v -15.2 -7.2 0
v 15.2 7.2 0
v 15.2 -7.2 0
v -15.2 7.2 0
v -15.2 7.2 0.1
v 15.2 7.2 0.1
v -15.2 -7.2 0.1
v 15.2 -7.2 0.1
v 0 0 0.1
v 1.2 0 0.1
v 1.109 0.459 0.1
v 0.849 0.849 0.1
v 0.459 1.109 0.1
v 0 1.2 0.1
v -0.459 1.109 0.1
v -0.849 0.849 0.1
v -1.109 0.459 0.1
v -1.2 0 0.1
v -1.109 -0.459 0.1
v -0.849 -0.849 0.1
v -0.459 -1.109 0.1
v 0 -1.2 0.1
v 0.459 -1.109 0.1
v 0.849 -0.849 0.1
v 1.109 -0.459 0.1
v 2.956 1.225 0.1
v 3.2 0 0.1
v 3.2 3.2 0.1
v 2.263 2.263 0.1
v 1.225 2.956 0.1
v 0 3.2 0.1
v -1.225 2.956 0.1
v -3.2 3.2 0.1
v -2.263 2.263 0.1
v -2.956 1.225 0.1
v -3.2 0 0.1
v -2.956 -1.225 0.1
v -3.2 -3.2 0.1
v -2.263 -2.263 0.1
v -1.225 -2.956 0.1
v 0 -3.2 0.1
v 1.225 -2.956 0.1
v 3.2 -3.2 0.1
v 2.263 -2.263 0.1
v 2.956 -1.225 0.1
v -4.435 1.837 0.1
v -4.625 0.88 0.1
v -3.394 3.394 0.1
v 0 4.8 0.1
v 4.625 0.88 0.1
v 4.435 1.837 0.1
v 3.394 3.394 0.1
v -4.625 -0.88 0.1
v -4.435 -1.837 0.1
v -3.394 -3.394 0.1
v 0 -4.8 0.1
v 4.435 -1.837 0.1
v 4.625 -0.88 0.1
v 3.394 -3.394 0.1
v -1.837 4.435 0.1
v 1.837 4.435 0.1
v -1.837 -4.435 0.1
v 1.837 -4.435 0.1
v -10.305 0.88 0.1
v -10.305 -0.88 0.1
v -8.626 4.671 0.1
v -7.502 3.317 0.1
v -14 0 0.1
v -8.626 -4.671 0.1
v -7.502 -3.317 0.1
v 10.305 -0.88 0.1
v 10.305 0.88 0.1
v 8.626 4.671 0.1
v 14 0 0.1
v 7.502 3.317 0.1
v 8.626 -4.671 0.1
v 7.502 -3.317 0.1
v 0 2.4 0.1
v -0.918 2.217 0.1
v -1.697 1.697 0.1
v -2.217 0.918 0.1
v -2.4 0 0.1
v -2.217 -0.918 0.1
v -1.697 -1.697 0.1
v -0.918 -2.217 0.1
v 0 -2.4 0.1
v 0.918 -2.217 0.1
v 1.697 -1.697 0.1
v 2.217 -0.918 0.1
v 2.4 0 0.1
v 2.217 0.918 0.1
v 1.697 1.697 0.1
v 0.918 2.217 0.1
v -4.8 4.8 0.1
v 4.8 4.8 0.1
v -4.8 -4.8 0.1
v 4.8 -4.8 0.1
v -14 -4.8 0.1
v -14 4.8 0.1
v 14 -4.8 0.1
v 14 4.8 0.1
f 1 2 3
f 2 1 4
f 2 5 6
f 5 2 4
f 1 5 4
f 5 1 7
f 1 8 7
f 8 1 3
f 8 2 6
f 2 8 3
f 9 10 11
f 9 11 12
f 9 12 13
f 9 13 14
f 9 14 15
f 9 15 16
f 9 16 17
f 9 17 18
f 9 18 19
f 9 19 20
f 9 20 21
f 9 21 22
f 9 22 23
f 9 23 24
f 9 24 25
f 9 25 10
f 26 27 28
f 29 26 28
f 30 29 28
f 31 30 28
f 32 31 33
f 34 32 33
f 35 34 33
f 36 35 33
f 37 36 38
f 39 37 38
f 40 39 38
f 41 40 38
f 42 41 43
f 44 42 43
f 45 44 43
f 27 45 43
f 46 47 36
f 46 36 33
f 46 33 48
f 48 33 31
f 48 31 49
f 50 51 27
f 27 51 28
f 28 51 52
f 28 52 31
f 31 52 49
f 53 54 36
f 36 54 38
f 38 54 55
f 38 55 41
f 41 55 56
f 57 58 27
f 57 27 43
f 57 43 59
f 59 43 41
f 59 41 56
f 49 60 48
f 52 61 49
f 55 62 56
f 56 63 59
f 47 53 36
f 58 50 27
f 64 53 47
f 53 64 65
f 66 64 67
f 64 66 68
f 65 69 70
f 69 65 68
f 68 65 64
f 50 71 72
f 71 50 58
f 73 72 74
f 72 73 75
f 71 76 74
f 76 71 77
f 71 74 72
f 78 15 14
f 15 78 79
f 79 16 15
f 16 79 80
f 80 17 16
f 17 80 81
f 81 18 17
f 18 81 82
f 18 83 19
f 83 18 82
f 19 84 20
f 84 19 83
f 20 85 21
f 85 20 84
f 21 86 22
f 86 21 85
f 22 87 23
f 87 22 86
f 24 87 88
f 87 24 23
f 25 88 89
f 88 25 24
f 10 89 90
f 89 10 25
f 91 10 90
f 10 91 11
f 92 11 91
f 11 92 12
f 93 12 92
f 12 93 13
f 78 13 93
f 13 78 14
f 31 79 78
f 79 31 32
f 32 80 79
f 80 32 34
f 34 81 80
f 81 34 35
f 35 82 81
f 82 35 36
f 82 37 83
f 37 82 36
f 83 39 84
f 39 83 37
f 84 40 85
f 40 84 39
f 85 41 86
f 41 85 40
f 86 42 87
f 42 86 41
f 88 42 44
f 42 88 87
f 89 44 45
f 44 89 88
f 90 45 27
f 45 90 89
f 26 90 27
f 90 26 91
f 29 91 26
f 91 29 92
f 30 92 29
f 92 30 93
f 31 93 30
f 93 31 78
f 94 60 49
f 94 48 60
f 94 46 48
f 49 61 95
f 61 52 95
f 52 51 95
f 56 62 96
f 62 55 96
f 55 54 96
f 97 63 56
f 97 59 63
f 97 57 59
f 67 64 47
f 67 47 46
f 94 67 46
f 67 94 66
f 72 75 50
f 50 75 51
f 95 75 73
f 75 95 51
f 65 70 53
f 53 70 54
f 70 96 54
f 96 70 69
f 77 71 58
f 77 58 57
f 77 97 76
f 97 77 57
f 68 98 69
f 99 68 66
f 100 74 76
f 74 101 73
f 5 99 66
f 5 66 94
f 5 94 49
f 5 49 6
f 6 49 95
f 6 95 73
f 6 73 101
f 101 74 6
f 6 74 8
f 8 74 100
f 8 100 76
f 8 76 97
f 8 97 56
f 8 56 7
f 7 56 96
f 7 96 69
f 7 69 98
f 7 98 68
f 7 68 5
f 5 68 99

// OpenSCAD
// file: ../p/empty.scad
use <../lib.scad>
function ldraw_lib__empty() = [
// 0 Empty
// 0 Name: empty.dat
// 0 Author: Steffen [Steffen]
// 0 !LDRAW_ORG Primitive UPDATE 2015-01
// 0 !LICENSE Licensed under CC BY 4.0 : see CAreadme.txt
// 
// 0 BFC CERTIFY CCW
  [0,"BFC","CERTIFY"],
  [0,"BFC","CCW"],
// 
// 0 !HISTORY 2015-10-11 [PTadmin] Official Update 2015-01
// 
// 
// 0 // Tool MLCad cannot handle really empty files. This file is used as a workaround.
// 0 // It exceptionally contains forbidden non-LDRAW standard syntax to satisfy MLCad until it is fixed OR a different editor has become the de-facto LDRAW standard.
// 0 // The line being used here is an "impossible" conditional line which never should be visible,
// 0 // additionally hidden by a syntax explicitly hiding it from displaying.
// 
// 0 MLCAD HIDE 5 24 0 0 0 0.0001 0 0 0.0001 -0.0001 0 0 0 0
];
module ldraw_lib__empty(step=0, col=false, unit=2/5, alt=false, line=0.2, solid=!$preview)
    makepoly(ldraw_lib__empty(), step=step, col=col, unit=unit, alt=alt, line=line, solid=solid);
ldraw_lib__empty(line=0.2);
// file: ../p/4-4ndis.scad
use <../lib.scad>
function ldraw_lib__4_4ndis() = [
// 0 Disc Negative 1.0
// 0 Name: 4-4ndis.dat
// 0 Author: James Jessiman
// 0 !LDRAW_ORG Primitive UPDATE 2012-01
// 0 !LICENSE Licensed under CC BY 4.0 : see CAreadme.txt
// 
// 0 BFC CERTIFY CCW
  [0,"BFC","CERTIFY"],
  [0,"BFC","CCW"],
// 
// 0 !HISTORY 2002-03-23 [sbliss] Added BFC statement; compacted code
// 0 !HISTORY 2002-04-25 [PTadmin] Official Update 2002-02
// 0 !HISTORY 2007-06-24 [PTadmin] Header formatted for Contributor Agreement
// 0 !HISTORY 2008-07-01 [PTadmin] Official Update 2008-01
// 0 !HISTORY 2012-02-16 [Philo] Changed to CCW
// 0 !HISTORY 2012-03-30 [PTadmin] Official Update 2012-01
// 
// 
// 3 16 0.9239 0 0.3827 1 0 0 1 0 1
  [3,16,0.9239,0,0.3827,1,0,0,1,0,1],
// 3 16 0.7071 0 0.7071 0.9239 0 0.3827 1 0 1
  [3,16,0.7071,0,0.7071,0.9239,0,0.3827,1,0,1],
// 3 16 0.3827 0 0.9239 0.7071 0 0.7071 1 0 1
  [3,16,0.3827,0,0.9239,0.7071,0,0.7071,1,0,1],
// 3 16 0 0 1 0.3827 0 0.9239 1 0 1
  [3,16,0,0,1,0.3827,0,0.9239,1,0,1],
// 3 16 -0.3827 0 0.9239 0 0 1 -1 0 1
  [3,16,-0.3827,0,0.9239,0,0,1,-1,0,1],
// 3 16 -0.7071 0 0.7071 -0.3827 0 0.9239 -1 0 1
  [3,16,-0.7071,0,0.7071,-0.3827,0,0.9239,-1,0,1],
// 3 16 -0.9239 0 0.3827 -0.7071 0 0.7071 -1 0 1
  [3,16,-0.9239,0,0.3827,-0.7071,0,0.7071,-1,0,1],
// 3 16 -1 0 0 -0.9239 0 0.3827 -1 0 1
  [3,16,-1,0,0,-0.9239,0,0.3827,-1,0,1],
// 3 16 -0.9239 0 -0.3827 -1 0 0 -1 0 -1
  [3,16,-0.9239,0,-0.3827,-1,0,0,-1,0,-1],
// 3 16 -0.7071 0 -0.7071 -0.9239 0 -0.3827 -1 0 -1
  [3,16,-0.7071,0,-0.7071,-0.9239,0,-0.3827,-1,0,-1],
// 3 16 -0.3827 0 -0.9239 -0.7071 0 -0.7071 -1 0 -1
  [3,16,-0.3827,0,-0.9239,-0.7071,0,-0.7071,-1,0,-1],
// 3 16 0 0 -1 -0.3827 0 -0.9239 -1 0 -1
  [3,16,0,0,-1,-0.3827,0,-0.9239,-1,0,-1],
// 3 16 0.3827 0 -0.9239 0 0 -1 1 0 -1
  [3,16,0.3827,0,-0.9239,0,0,-1,1,0,-1],
// 3 16 0.7071 0 -0.7071 0.3827 0 -0.9239 1 0 -1
  [3,16,0.7071,0,-0.7071,0.3827,0,-0.9239,1,0,-1],
// 3 16 0.9239 0 -0.3827 0.7071 0 -0.7071 1 0 -1
  [3,16,0.9239,0,-0.3827,0.7071,0,-0.7071,1,0,-1],
// 3 16 1 0 0 0.9239 0 -0.3827 1 0 -1
  [3,16,1,0,0,0.9239,0,-0.3827,1,0,-1],
];
module ldraw_lib__4_4ndis(step=0, col=false, unit=2/5, alt=false, line=0.2, solid=!$preview)
    makepoly(ldraw_lib__4_4ndis(), step=step, col=col, unit=unit, alt=alt, line=line, solid=solid);
ldraw_lib__4_4ndis(line=0.2);
// file: ../p/4-4disc.scad
use <../lib.scad>
function ldraw_lib__4_4disc() = [
// 0 Disc 1.0
// 0 Name: 4-4disc.dat
// 0 Author: James Jessiman
// 0 !LDRAW_ORG Primitive UPDATE 2002-02
// 0 !LICENSE Licensed under CC BY 4.0 : see CAreadme.txt
// 
// 0 BFC CERTIFY CCW
  [0,"BFC","CERTIFY"],
  [0,"BFC","CCW"],
// 
// 0 !HISTORY 1998-12-15 [PTadmin] Official Update 1998-10
// 0 !HISTORY 2002-03-23 [sbliss] Added BFC statement
// 0 !HISTORY 2002-04-25 [PTadmin] Official Update 2002-02
// 0 !HISTORY 2007-06-24 [PTadmin] Header formatted for Contributor Agreement
// 0 !HISTORY 2008-07-01 [PTadmin] Official Update 2008-01
// 
// 
// 3 16 0 0 0 1 0 0 0.9239 0 0.3827
  [3,16,0,0,0,1,0,0,0.9239,0,0.3827],
// 3 16 0 0 0 0.9239 0 0.3827 0.7071 0 0.7071
  [3,16,0,0,0,0.9239,0,0.3827,0.7071,0,0.7071],
// 3 16 0 0 0 0.7071 0 0.7071 0.3827 0 0.9239
  [3,16,0,0,0,0.7071,0,0.7071,0.3827,0,0.9239],
// 3 16 0 0 0 0.3827 0 0.9239 0 0 1
  [3,16,0,0,0,0.3827,0,0.9239,0,0,1],
// 3 16 0 0 0 0 0 1 -0.3827 0 0.9239
  [3,16,0,0,0,0,0,1,-0.3827,0,0.9239],
// 3 16 0 0 0 -0.3827 0 0.9239 -0.7071 0 0.7071
  [3,16,0,0,0,-0.3827,0,0.9239,-0.7071,0,0.7071],
// 3 16 0 0 0 -0.7071 0 0.7071 -0.9239 0 0.3827
  [3,16,0,0,0,-0.7071,0,0.7071,-0.9239,0,0.3827],
// 3 16 0 0 0 -0.9239 0 0.3827 -1 0 -0
  [3,16,0,0,0,-0.9239,0,0.3827,-1,0,-0],
// 3 16 0 0 0 -1 0 -0 -0.9239 0 -0.3827
  [3,16,0,0,0,-1,0,-0,-0.9239,0,-0.3827],
// 3 16 0 0 0 -0.9239 0 -0.3827 -0.7071 0 -0.7071
  [3,16,0,0,0,-0.9239,0,-0.3827,-0.7071,0,-0.7071],
// 3 16 0 0 0 -0.7071 0 -0.7071 -0.3827 0 -0.9239
  [3,16,0,0,0,-0.7071,0,-0.7071,-0.3827,0,-0.9239],
// 3 16 0 0 0 -0.3827 0 -0.9239 0 0 -1
  [3,16,0,0,0,-0.3827,0,-0.9239,0,0,-1],
// 3 16 0 0 0 0 0 -1 0.3827 0 -0.9239
  [3,16,0,0,0,0,0,-1,0.3827,0,-0.9239],
// 3 16 0 0 0 0.3827 0 -0.9239 0.7071 0 -0.7071
  [3,16,0,0,0,0.3827,0,-0.9239,0.7071,0,-0.7071],
// 3 16 0 0 0 0.7071 0 -0.7071 0.9239 0 -0.3827
  [3,16,0,0,0,0.7071,0,-0.7071,0.9239,0,-0.3827],
// 3 16 0 0 0 0.9239 0 -0.3827 1 0 0
  [3,16,0,0,0,0.9239,0,-0.3827,1,0,0],
// 0
];
module ldraw_lib__4_4disc(step=0, col=false, unit=2/5, alt=false, line=0.2, solid=!$preview)
    makepoly(ldraw_lib__4_4disc(), step=step, col=col, unit=unit, alt=alt, line=line, solid=solid);
ldraw_lib__4_4disc(line=0.2);
// file: ../p/1-8chrd.scad
use <../lib.scad>
function ldraw_lib__1_8chrd() = [
// 0 Chord 0.125
// 0 Name: 1-8chrd.dat
// 0 Author: Orion Pobursky [OrionP]
// 0 !LDRAW_ORG Primitive UPDATE 2023-05
// 0 !LICENSE Licensed under CC BY 4.0 : see CAreadme.txt
// 
// 0 BFC CERTIFY CCW
  [0,"BFC","CERTIFY"],
  [0,"BFC","CCW"],
// 
// 0 !HISTORY 2004-04-22 [PTadmin] Official Update 2004-02
// 0 !HISTORY 2007-06-22 [PTadmin] Header formatted for Contributor Agreement
// 0 !HISTORY 2008-07-01 [PTadmin] Official Update 2008-01
// 0 !HISTORY 2023-10-27 [OrionP] Rebuilt with PrimGen2, original author westrate
// 0 !HISTORY 2023-10-31 [OrionP] Official Update 2023-05
// 
// 3 16 1 0 0 0.9239 0 0.3827 0.7071 0 0.7071
  [3,16,1,0,0,0.9239,0,0.3827,0.7071,0,0.7071],
];
module ldraw_lib__1_8chrd(step=0, col=false, unit=2/5, alt=false, line=0.2, solid=!$preview)
    makepoly(ldraw_lib__1_8chrd(), step=step, col=col, unit=unit, alt=alt, line=line, solid=solid);
ldraw_lib__1_8chrd(line=0.2);
// file: ../p/1-16chrd.scad
use <../lib.scad>
use <empty.scad>
function ldraw_lib__1_16chrd() = [
// 0 Chord 0.0625
// 0 Name: 1-16chrd.dat
// 0 Author: Philippe Hurbain [Philo]
// 0 !LDRAW_ORG Primitive UPDATE 2015-01
// 0 !LICENSE Licensed under CC BY 4.0 : see CAreadme.txt
// 
// 0 BFC CERTIFY CCW
  [0,"BFC","CERTIFY"],
  [0,"BFC","CCW"],
// 
// 0 !HISTORY 2015-10-11 [PTadmin] Official Update 2015-01
// 
// 
// 0 // This file is intentionally empty because at the current \P resolution,
// 0 // an 1-16chrd is actually empty. However, this file still is present
// 0 // to allow tools to do primitives substition and fill in a real chrd here,
// 0 // or, if desired, to substitute this with the hi-res 48\1-16chrd.
// 
// 0 // This file is based on an idea by Darats at http://forums.ldraw.org/read.php?19,14500,14500#msg-14500
// 
// 1 16 0 0 0 1 0 0 0 1 0 0 0 1 empty.dat
  [1,16,0,0,0,1,0,0,0,1,0,0,0,1, ldraw_lib__empty()],
];
module ldraw_lib__1_16chrd(step=0, col=false, unit=2/5, alt=false, line=0.2, solid=!$preview)
    makepoly(ldraw_lib__1_16chrd(), step=step, col=col, unit=unit, alt=alt, line=line, solid=solid);
ldraw_lib__1_16chrd(line=0.2);
// file: ../p/4-4ring3.scad
use <../lib.scad>
function ldraw_lib__4_4ring3() = [
// 0 Ring  3 x 1.0
// 0 Name: 4-4ring3.dat
// 0 Author: James Jessiman
// 0 !LDRAW_ORG Primitive UPDATE 2009-01
// 0 !LICENSE Licensed under CC BY 4.0 : see CAreadme.txt
// 
// 0 BFC CERTIFY CCW
  [0,"BFC","CERTIFY"],
  [0,"BFC","CCW"],
// 
// 0 !HISTORY 1998-12-15 [PTadmin] Official Update 1998-10
// 0 !HISTORY 2002-04-05 [hafhead] Added BFC statement
// 0 !HISTORY 2002-04-25 [PTadmin] Official Update 2002-02
// 0 !HISTORY 2007-06-24 [PTadmin] Header formatted for Contributor Agreement
// 0 !HISTORY 2008-07-01 [PTadmin] Official Update 2008-01
// 0 !HISTORY 2008-08-26 [cwdee] Switch polygon winding and rename
// 0 !HISTORY 2009-05-02 [PTadmin] Official Update 2009-01
// 
// 
// 4 16 -1.5308 0 3.6956 -1.1481 0 2.7717 0 0 3 0 0 4
  [4,16,-1.5308,0,3.6956,-1.1481,0,2.7717,0,0,3,0,0,4],
// 4 16 -2.8284 0 2.8284 -2.1213 0 2.1213 -1.1481 0 2.7717 -1.5308 0 3.6956
  [4,16,-2.8284,0,2.8284,-2.1213,0,2.1213,-1.1481,0,2.7717,-1.5308,0,3.6956],
// 4 16 -3.6956 0 1.5308 -2.7717 0 1.1481 -2.1213 0 2.1213 -2.8284 0 2.8284
  [4,16,-3.6956,0,1.5308,-2.7717,0,1.1481,-2.1213,0,2.1213,-2.8284,0,2.8284],
// 4 16 -4 0 0 -3 0 0 -2.7717 0 1.1481 -3.6956 0 1.5308
  [4,16,-4,0,0,-3,0,0,-2.7717,0,1.1481,-3.6956,0,1.5308],
// 4 16 -3.6956 0 -1.5308 -2.7717 0 -1.1481 -3 0 0 -4 0 0
  [4,16,-3.6956,0,-1.5308,-2.7717,0,-1.1481,-3,0,0,-4,0,0],
// 4 16 -2.8284 0 -2.8284 -2.1213 0 -2.1213 -2.7717 0 -1.1481 -3.6956 0 -1.5308
  [4,16,-2.8284,0,-2.8284,-2.1213,0,-2.1213,-2.7717,0,-1.1481,-3.6956,0,-1.5308],
// 4 16 -1.5308 0 -3.6956 -1.1481 0 -2.7717 -2.1213 0 -2.1213 -2.8284 0 -2.8284
  [4,16,-1.5308,0,-3.6956,-1.1481,0,-2.7717,-2.1213,0,-2.1213,-2.8284,0,-2.8284],
// 4 16 0 0 -4 0 0 -3 -1.1481 0 -2.7717 -1.5308 0 -3.6956
  [4,16,0,0,-4,0,0,-3,-1.1481,0,-2.7717,-1.5308,0,-3.6956],
// 4 16 1.5308 0 -3.6956 1.1481 0 -2.7717 0 0 -3 0 0 -4
  [4,16,1.5308,0,-3.6956,1.1481,0,-2.7717,0,0,-3,0,0,-4],
// 4 16 2.8284 0 -2.8284 2.1213 0 -2.1213 1.1481 0 -2.7717 1.5308 0 -3.6956
  [4,16,2.8284,0,-2.8284,2.1213,0,-2.1213,1.1481,0,-2.7717,1.5308,0,-3.6956],
// 4 16 3.6956 0 -1.5308 2.7717 0 -1.1481 2.1213 0 -2.1213 2.8284 0 -2.8284
  [4,16,3.6956,0,-1.5308,2.7717,0,-1.1481,2.1213,0,-2.1213,2.8284,0,-2.8284],
// 4 16 4 0 0 3 0 0 2.7717 0 -1.1481 3.6956 0 -1.5308
  [4,16,4,0,0,3,0,0,2.7717,0,-1.1481,3.6956,0,-1.5308],
// 4 16 3.6956 0 1.5308 2.7717 0 1.1481 3 0 0 4 0 0
  [4,16,3.6956,0,1.5308,2.7717,0,1.1481,3,0,0,4,0,0],
// 4 16 2.8284 0 2.8284 2.1213 0 2.1213 2.7717 0 1.1481 3.6956 0 1.5308
  [4,16,2.8284,0,2.8284,2.1213,0,2.1213,2.7717,0,1.1481,3.6956,0,1.5308],
// 4 16 1.5308 0 3.6956 1.1481 0 2.7717 2.1213 0 2.1213 2.8284 0 2.8284
  [4,16,1.5308,0,3.6956,1.1481,0,2.7717,2.1213,0,2.1213,2.8284,0,2.8284],
// 4 16 0 0 4 0 0 3 1.1481 0 2.7717 1.5308 0 3.6956
  [4,16,0,0,4,0,0,3,1.1481,0,2.7717,1.5308,0,3.6956],
// 0
];
module ldraw_lib__4_4ring3(step=0, col=false, unit=2/5, alt=false, line=0.2, solid=!$preview)
    makepoly(ldraw_lib__4_4ring3(), step=step, col=col, unit=unit, alt=alt, line=line, solid=solid);
ldraw_lib__4_4ring3(line=0.2);
// file: ../p/4-4ring1.scad
use <../lib.scad>
function ldraw_lib__4_4ring1() = [
// 0 Ring  1 x 1.0
// 0 Name: 4-4ring1.dat
// 0 Author: James Jessiman
// 0 !LDRAW_ORG Primitive UPDATE 2009-01
// 0 !LICENSE Licensed under CC BY 4.0 : see CAreadme.txt
// 
// 0 BFC CERTIFY CCW
  [0,"BFC","CERTIFY"],
  [0,"BFC","CCW"],
// 
// 0 !HISTORY 1998-12-15 [PTadmin] Official Update 1998-10
// 0 !HISTORY 2002-04-08 [BrickCaster] Modified for BFC compliance
// 0 !HISTORY 2002-04-25 [PTadmin] Official Update 2002-02
// 0 !HISTORY 2007-06-24 [PTadmin] Header formatted for Contributor Agreement
// 0 !HISTORY 2008-07-01 [PTadmin] Official Update 2008-01
// 0 !HISTORY 2008-08-26 [cwdee] Switch polygon winding and rename
// 0 !HISTORY 2009-05-02 [PTadmin] Official Update 2009-01
// 
// 
// 4 16 -0.7654 0 1.8478 -0.3827 0 0.9239 0 0 1 0 0 2
  [4,16,-0.7654,0,1.8478,-0.3827,0,0.9239,0,0,1,0,0,2],
// 4 16 -1.4142 0 1.4142 -0.7071 0 0.7071 -0.3827 0 0.9239 -0.7654 0 1.8478
  [4,16,-1.4142,0,1.4142,-0.7071,0,0.7071,-0.3827,0,0.9239,-0.7654,0,1.8478],
// 4 16 -1.8478 0 0.7654 -0.9239 0 0.3827 -0.7071 0 0.7071 -1.4142 0 1.41420
  [4,16,-1.8478,0,0.7654,-0.9239,0,0.3827,-0.7071,0,0.7071,-1.4142,0,1.41420],
// 4 16 -2 0 0 -1 0 0 -0.9239 0 0.3827 -1.8478 0 0.7654
  [4,16,-2,0,0,-1,0,0,-0.9239,0,0.3827,-1.8478,0,0.7654],
// 4 16 -1.8478 0 -0.7654 -0.9239 0 -0.3827 -1 0 0 -2 0 0
  [4,16,-1.8478,0,-0.7654,-0.9239,0,-0.3827,-1,0,0,-2,0,0],
// 4 16 -1.4142 0 -1.4142 -0.7071 0 -0.7071 -0.9239 0 -0.3827 -1.8478 0 -0.7654
  [4,16,-1.4142,0,-1.4142,-0.7071,0,-0.7071,-0.9239,0,-0.3827,-1.8478,0,-0.7654],
// 4 16 -0.7654 0 -1.8478 -0.3827 0 -0.9239 -0.7071 0 -0.7071 -1.4142 0 -1.4142
  [4,16,-0.7654,0,-1.8478,-0.3827,0,-0.9239,-0.7071,0,-0.7071,-1.4142,0,-1.4142],
// 4 16 0 0 -2 0 0 -1 -0.3827 0 -0.9239 -0.7654 0 -1.8478
  [4,16,0,0,-2,0,0,-1,-0.3827,0,-0.9239,-0.7654,0,-1.8478],
// 4 16 0.7654 0 -1.8478 0.3827 0 -0.9239 0 0 -1 0 0 -2
  [4,16,0.7654,0,-1.8478,0.3827,0,-0.9239,0,0,-1,0,0,-2],
// 4 16 1.4142 0 -1.4142 0.7071 0 -0.7071 0.3827 0 -0.9239 0.7654 0 -1.8478
  [4,16,1.4142,0,-1.4142,0.7071,0,-0.7071,0.3827,0,-0.9239,0.7654,0,-1.8478],
// 4 16 1.8478 0 -0.7654 0.9239 0 -0.3827 0.7071 0 -0.7071 1.4142 0 -1.4142
  [4,16,1.8478,0,-0.7654,0.9239,0,-0.3827,0.7071,0,-0.7071,1.4142,0,-1.4142],
// 4 16 2 0 0 1 0 0 0.9239 0 -0.3827 1.8478 0 -0.7654
  [4,16,2,0,0,1,0,0,0.9239,0,-0.3827,1.8478,0,-0.7654],
// 4 16 1.8478 0 0.7654 0.9239 0 0.3827 1 0 0 2 0 0
  [4,16,1.8478,0,0.7654,0.9239,0,0.3827,1,0,0,2,0,0],
// 4 16 1.4142 0 1.4142 0.7071 0 0.7071 0.9239 0 0.3827 1.8478 0 0.7654
  [4,16,1.4142,0,1.4142,0.7071,0,0.7071,0.9239,0,0.3827,1.8478,0,0.7654],
// 4 16 0.7654 0 1.8478 0.3827 0 0.9239 0.7071 0 0.7071 1.4142 0 1.4142
  [4,16,0.7654,0,1.8478,0.3827,0,0.9239,0.7071,0,0.7071,1.4142,0,1.4142],
// 4 16 0 0 2 0 0 1 0.3827 0 0.9239 0.7654 0 1.8478
  [4,16,0,0,2,0,0,1,0.3827,0,0.9239,0.7654,0,1.8478],
// 0
];
module ldraw_lib__4_4ring1(step=0, col=false, unit=2/5, alt=false, line=0.2, solid=!$preview)
    makepoly(ldraw_lib__4_4ring1(), step=step, col=col, unit=unit, alt=alt, line=line, solid=solid);
ldraw_lib__4_4ring1(line=0.2);
// file: ../p/3-16ndis.scad
use <../lib.scad>
function ldraw_lib__3_16ndis() = [
// 0 Disc Negative 0.1875
// 0 Name: 3-16ndis.dat
// 0 Author: Guy Vivan [guyvivan]
// 0 !LDRAW_ORG Primitive UPDATE 2009-01
// 0 !LICENSE Licensed under CC BY 2.0 and CC BY 4.0 : see CAreadme.txt
// 
// 0 BFC CERTIFY CCW
  [0,"BFC","CERTIFY"],
  [0,"BFC","CCW"],
// 
// 0 !HISTORY 2009-05-02 [PTadmin] Official Update 2009-01
// 
// 
// 3 16 1 0 1 0.9239 0 0.3827 1 0 0
  [3,16,1,0,1,0.9239,0,0.3827,1,0,0],
// 3 16 1 0 1 0.7071 0 0.7071 0.9239 0 0.3827
  [3,16,1,0,1,0.7071,0,0.7071,0.9239,0,0.3827],
// 3 16 1 0 1 0.3827 0 0.9239 0.7071 0 0.7071
  [3,16,1,0,1,0.3827,0,0.9239,0.7071,0,0.7071],
// 
// 0 end of file
// 
];
module ldraw_lib__3_16ndis(step=0, col=false, unit=2/5, alt=false, line=0.2, solid=!$preview)
    makepoly(ldraw_lib__3_16ndis(), step=step, col=col, unit=unit, alt=alt, line=line, solid=solid);
ldraw_lib__3_16ndis(line=0.2);
// file: ../p/logo-train-2006.scad
use <../lib.scad>
use <1-16chrd.scad>
use <1-8chrd.scad>
use <4-4disc.scad>
use <4-4ndis.scad>
function ldraw_lib__logo_train_2006() = [
// 0 Logo Train 2006
// 0 Name: logo-train-2006.dat
// 0 Author: Gerald Lasser [GeraldLasser]
// 0 !LDRAW_ORG Primitive UPDATE 2023-07
// 0 !LICENSE Licensed under CC BY 4.0 : see CAreadme.txt
// 
// 0 BFC CERTIFY CCW
  [0,"BFC","CERTIFY"],
  [0,"BFC","CCW"],
// 
// 0 !HISTORY 2023-12-31 [OrionP] Official Update 2023-07
// 
// 
// 1 16 0 -.25 0 3 0 0 0 1 0 0 0 3 4-4disc.dat
  [1,16,0,-.25,0,3,0,0,0,1,0,0,0,3, ldraw_lib__4_4disc()],
// 1 16 0 -.25 0 8 0 0 0 1 0 0 0 8 4-4ndis.dat
  [1,16,0,-.25,0,8,0,0,0,1,0,0,0,8, ldraw_lib__4_4ndis()],
// 3 16 -11.0868 -.25 4.5924 -11.5625 -.25 2.2 -8 -.25 0
  [3,16,-11.0868,-.25,4.5924,-11.5625,-.25,2.2,-8,-.25,0],
// 3 16 -11.0868 -.25 4.5924 -8 -.25 0 -8 -.25 8
  [3,16,-11.0868,-.25,4.5924,-8,-.25,0,-8,-.25,8],
// 3 16 -11.0868 -.25 4.5924 -8 -.25 8 -8.4852 -.25 8.4852
  [3,16,-11.0868,-.25,4.5924,-8,-.25,8,-8.4852,-.25,8.4852],
// 3 16 -8.4852 -.25 8.4852 -8 -.25 8 0 -.25 8
  [3,16,-8.4852,-.25,8.4852,-8,-.25,8,0,-.25,8],
// 3 16 -8.4852 -.25 8.4852 0 -.25 8 0 -.25 12
  [3,16,-8.4852,-.25,8.4852,0,-.25,8,0,-.25,12],
// 3 16 11.5625 -.25 2.2 11.0868 -.25 4.5924 8 -.25 0
  [3,16,11.5625,-.25,2.2,11.0868,-.25,4.5924,8,-.25,0],
// 3 16 8 -.25 0 11.0868 -.25 4.5924 8 -.25 8
  [3,16,8,-.25,0,11.0868,-.25,4.5924,8,-.25,8],
// 3 16 8 -.25 8 11.0868 -.25 4.5924 8.4852 -.25 8.4852
  [3,16,8,-.25,8,11.0868,-.25,4.5924,8.4852,-.25,8.4852],
// 3 16 8 -.25 8 8.4852 -.25 8.4852 0 -.25 8
  [3,16,8,-.25,8,8.4852,-.25,8.4852,0,-.25,8],
// 3 16 0 -.25 8 8.4852 -.25 8.4852 0 -.25 12
  [3,16,0,-.25,8,8.4852,-.25,8.4852,0,-.25,12],
// 
// 3 16 -11.5625 -.25 -2.2 -11.0868 -.25 -4.5924 -8 -.25 0
  [3,16,-11.5625,-.25,-2.2,-11.0868,-.25,-4.5924,-8,-.25,0],
// 3 16 -8 -.25 0 -11.0868 -.25 -4.5924 -8 -.25 -8
  [3,16,-8,-.25,0,-11.0868,-.25,-4.5924,-8,-.25,-8],
// 3 16 -8 -.25 -8 -11.0868 -.25 -4.5924 -8.4852 -.25 -8.4852
  [3,16,-8,-.25,-8,-11.0868,-.25,-4.5924,-8.4852,-.25,-8.4852],
// 3 16 -8 -.25 -8 -8.4852 -.25 -8.4852 0 -.25 -8
  [3,16,-8,-.25,-8,-8.4852,-.25,-8.4852,0,-.25,-8],
// 3 16 0 -.25 -8 -8.4852 -.25 -8.4852 0 -.25 -12
  [3,16,0,-.25,-8,-8.4852,-.25,-8.4852,0,-.25,-12],
// 3 16 11.0868 -.25 -4.5924 11.5625 -.25 -2.2 8 -.25 0
  [3,16,11.0868,-.25,-4.5924,11.5625,-.25,-2.2,8,-.25,0],
// 3 16 11.0868 -.25 -4.5924 8 -.25 0 8 -.25 -8
  [3,16,11.0868,-.25,-4.5924,8,-.25,0,8,-.25,-8],
// 3 16 11.0868 -.25 -4.5924 8 -.25 -8 8.4852 -.25 -8.4852
  [3,16,11.0868,-.25,-4.5924,8,-.25,-8,8.4852,-.25,-8.4852],
// 3 16 8.4852 -.25 -8.4852 8 -.25 -8 0 -.25 -8
  [3,16,8.4852,-.25,-8.4852,8,-.25,-8,0,-.25,-8],
// 3 16 8.4852 -.25 -8.4852 0 -.25 -8 0 -.25 -12
  [3,16,8.4852,-.25,-8.4852,0,-.25,-8,0,-.25,-12],
// 
// 1 16 0 -.25 0 0 0 -12 0 1 0 12 0 0 1-8chrd.dat
  [1,16,0,-.25,0,0,0,-12,0,1,0,12,0,0, ldraw_lib__1_8chrd()],
// 1 16 0 -.25 0 0 0 12 0 1 0 12 0 0 1-8chrd.dat
  [1,16,0,-.25,0,0,0,12,0,1,0,12,0,0, ldraw_lib__1_8chrd()],
// 1 16 0 -.25 0 -8.48528 0 -8.48528 0 1 0 8.48528 0 -8.48528 1-16chrd.dat
  [1,16,0,-.25,0,-8.48528,0,-8.48528,0,1,0,8.48528,0,-8.48528, ldraw_lib__1_16chrd()],
// 1 16 0 -.25 0 8.48528 0 8.48528 0 1 0 8.48528 0 -8.48528 1-16chrd.dat
  [1,16,0,-.25,0,8.48528,0,8.48528,0,1,0,8.48528,0,-8.48528, ldraw_lib__1_16chrd()],
// 1 16 0 -.25 0 0 0 -12 0 1 0 -12 0 0 1-8chrd.dat
  [1,16,0,-.25,0,0,0,-12,0,1,0,-12,0,0, ldraw_lib__1_8chrd()],
// 1 16 0 -.25 0 0 0 12 0 1 0 -12 0 0 1-8chrd.dat
  [1,16,0,-.25,0,0,0,12,0,1,0,-12,0,0, ldraw_lib__1_8chrd()],
// 1 16 0 -.25 0 -8.48528 0 -8.48528 0 1 0 -8.48528 0 8.48528 1-16chrd.dat
  [1,16,0,-.25,0,-8.48528,0,-8.48528,0,1,0,-8.48528,0,8.48528, ldraw_lib__1_16chrd()],
// 1 16 0 -.25 0 8.48528 0 8.48528 0 1 0 -8.48528 0 8.48528 1-16chrd.dat
  [1,16,0,-.25,0,8.48528,0,8.48528,0,1,0,-8.48528,0,8.48528, ldraw_lib__1_16chrd()],
// 
// 3 16 -11.5625 -.25 2.2 -11.5625 -.25 -2.2 -8 -.25 0
  [3,16,-11.5625,-.25,2.2,-11.5625,-.25,-2.2,-8,-.25,0],
// 3 16 11.5625 -.25 -2.2 11.5625 -.25 2.2 8 -.25 0
  [3,16,11.5625,-.25,-2.2,11.5625,-.25,2.2,8,-.25,0],
// 4 16 -25.7625 -.25 2.2 -25.7625 -.25 -2.2 -11.5625 -.25 -2.2 -11.5625 -.25 2.2
  [4,16,-25.7625,-.25,2.2,-25.7625,-.25,-2.2,-11.5625,-.25,-2.2,-11.5625,-.25,2.2],
// 4 16 -35 -.25 0 -25.7625 -.25 2.2 -18.755 -.25 8.2915 -21.5662 -.25 11.6778
  [4,16,-35,-.25,0,-25.7625,-.25,2.2,-18.755,-.25,8.2915,-21.5662,-.25,11.6778],
// 4 16 -18.755 -.25 -8.2915 -25.7625 -.25 -2.2 -35 -.25 0 -21.5662 -.25 -11.6778
  [4,16,-18.755,-.25,-8.2915,-25.7625,-.25,-2.2,-35,-.25,0,-21.5662,-.25,-11.6778],
// 3 16 -35 -.25 0 -25.7625 -.25 -2.2 -25.7625 -.25 2.2
  [3,16,-35,-.25,0,-25.7625,-.25,-2.2,-25.7625,-.25,2.2],
// 4 16 11.5625 -.25 -2.2 25.7625 -.25 -2.2 25.7625 -.25 2.2 11.5625 -.25 2.2
  [4,16,11.5625,-.25,-2.2,25.7625,-.25,-2.2,25.7625,-.25,2.2,11.5625,-.25,2.2],
// 4 16 18.755 -.25 8.2915 25.7625 -.25 2.2 35 -.25 0 21.5662 -.25 11.6778
  [4,16,18.755,-.25,8.2915,25.7625,-.25,2.2,35,-.25,0,21.5662,-.25,11.6778],
// 4 16 35 -.25 0 25.7625 -.25 -2.2 18.755 -.25 -8.2915 21.5662 -.25 -11.6778
  [4,16,35,-.25,0,25.7625,-.25,-2.2,18.755,-.25,-8.2915,21.5662,-.25,-11.6778],
// 3 16 25.7625 -.25 -2.2 35 -.25 0 25.7625 -.25 2.2
  [3,16,25.7625,-.25,-2.2,35,-.25,0,25.7625,-.25,2.2],
];
module ldraw_lib__logo_train_2006(step=0, col=false, unit=2/5, alt=false, line=0.2, solid=!$preview)
    makepoly(ldraw_lib__logo_train_2006(), step=step, col=col, unit=unit, alt=alt, line=line, solid=solid);
ldraw_lib__logo_train_2006(line=0.2);
// file: ../p/logo-train-2006-box.scad
use <../lib.scad>
use <3-16ndis.scad>
use <4-4ring1.scad>
use <4-4ring3.scad>
function ldraw_lib__logo_train_2006_box() = [
// 0 Logo Train 2006 Outer Box
// 0 Name: logo-train-2006-box.dat
// 0 Author: Gerald Lasser [GeraldLasser]
// 0 !LDRAW_ORG Primitive UPDATE 2023-07
// 0 !LICENSE Licensed under CC BY 4.0 : see CAreadme.txt
// 
// 0 BFC CERTIFY CCW
  [0,"BFC","CERTIFY"],
  [0,"BFC","CCW"],
// 
// 0 !HISTORY 2023-12-31 [OrionP] Official Update 2023-07
// 
// 
// 1 16 0 -.25 0 3 0 0 0 1 0 0 0 3 4-4ring1.dat
  [1,16,0,-.25,0,3,0,0,0,1,0,0,0,3, ldraw_lib__4_4ring1()],
// 1 16 0 -.25 0 2 0 0 0 1 0 0 0 2 4-4ring3.dat
  [1,16,0,-.25,0,2,0,0,0,1,0,0,0,2, ldraw_lib__4_4ring3()],
// 1 16 0 -.25 0 0 0 -12 0 1 0 12 0 0 3-16ndis.dat
  [1,16,0,-.25,0,0,0,-12,0,1,0,12,0,0, ldraw_lib__3_16ndis()],
// 1 16 0 -.25 0 0 0 12 0 1 0 12 0 0 3-16ndis.dat
  [1,16,0,-.25,0,0,0,12,0,1,0,12,0,0, ldraw_lib__3_16ndis()],
// 1 16 0 -.25 0 0 0 -12 0 1 0 -12 0 0 3-16ndis.dat
  [1,16,0,-.25,0,0,0,-12,0,1,0,-12,0,0, ldraw_lib__3_16ndis()],
// 1 16 0 -.25 0 0 0 12 0 1 0 -12 0 0 3-16ndis.dat
  [1,16,0,-.25,0,0,0,12,0,1,0,-12,0,0, ldraw_lib__3_16ndis()],
// 
// 3 16 -18.755 -.25 8.2915 -25.7625 -.25 2.2 -11.5625 -.25 2.2
  [3,16,-18.755,-.25,8.2915,-25.7625,-.25,2.2,-11.5625,-.25,2.2],
// 3 16 -18.755 -.25 8.2915 -11.5625 -.25 2.2 -11.0868 -.25 4.5924
  [3,16,-18.755,-.25,8.2915,-11.5625,-.25,2.2,-11.0868,-.25,4.5924],
// 4 16 -12 -.25 12 -21.5662 -.25 11.6778 -18.755 -.25 8.2915 -11.0868 -.25 4.5924
  [4,16,-12,-.25,12,-21.5662,-.25,11.6778,-18.755,-.25,8.2915,-11.0868,-.25,4.5924],
// 3 16 25.7625 -.25 2.2 18.755 -.25 8.2915 11.5625 -.25 2.2
  [3,16,25.7625,-.25,2.2,18.755,-.25,8.2915,11.5625,-.25,2.2],
// 3 16 11.5625 -.25 2.2 18.755 -.25 8.2915 11.0868 -.25 4.5924
  [3,16,11.5625,-.25,2.2,18.755,-.25,8.2915,11.0868,-.25,4.5924],
// 4 16 18.755 -.25 8.2915 21.5662 -.25 11.6778 12 -.25 12 11.0868 -.25 4.5924
  [4,16,18.755,-.25,8.2915,21.5662,-.25,11.6778,12,-.25,12,11.0868,-.25,4.5924],
// 3 16 -25.7625 -.25 -2.2 -18.755 -.25 -8.2915 -11.5625 -.25 -2.2
  [3,16,-25.7625,-.25,-2.2,-18.755,-.25,-8.2915,-11.5625,-.25,-2.2],
// 3 16 -11.5625 -.25 -2.2 -18.755 -.25 -8.2915 -11.0868 -.25 -4.5924
  [3,16,-11.5625,-.25,-2.2,-18.755,-.25,-8.2915,-11.0868,-.25,-4.5924],
// 4 16 -18.755 -.25 -8.2915 -21.5662 -.25 -11.6778 -12 -.25 -12 -11.0868 -.25 -4.5924
  [4,16,-18.755,-.25,-8.2915,-21.5662,-.25,-11.6778,-12,-.25,-12,-11.0868,-.25,-4.5924],
// 3 16 18.755 -.25 -8.2915 25.7625 -.25 -2.2 11.5625 -.25 -2.2
  [3,16,18.755,-.25,-8.2915,25.7625,-.25,-2.2,11.5625,-.25,-2.2],
// 3 16 18.755 -.25 -8.2915 11.5625 -.25 -2.2 11.0868 -.25 -4.5924
  [3,16,18.755,-.25,-8.2915,11.5625,-.25,-2.2,11.0868,-.25,-4.5924],
// 4 16 12 -.25 -12 21.5662 -.25 -11.6778 18.755 -.25 -8.2915 11.0868 -.25 -4.5924
  [4,16,12,-.25,-12,21.5662,-.25,-11.6778,18.755,-.25,-8.2915,11.0868,-.25,-4.5924],
// 
// 3 16 -35 -.25 0 -35 -.25 -12 -21.5662 -.25 -11.6778
  [3,16,-35,-.25,0,-35,-.25,-12,-21.5662,-.25,-11.6778],
// 3 16 -35 -.25 12 -35 -.25 0 -21.5662 -.25 11.6778
  [3,16,-35,-.25,12,-35,-.25,0,-21.5662,-.25,11.6778],
// 3 16 35 -.25 -12 35 -.25 0 21.5662 -.25 -11.6778
  [3,16,35,-.25,-12,35,-.25,0,21.5662,-.25,-11.6778],
// 3 16 35 -.25 0 35 -.25 12 21.5662 -.25 11.6778
  [3,16,35,-.25,0,35,-.25,12,21.5662,-.25,11.6778],
];
module ldraw_lib__logo_train_2006_box(step=0, col=false, unit=2/5, alt=false, line=0.2, solid=!$preview)
    makepoly(ldraw_lib__logo_train_2006_box(), step=step, col=col, unit=unit, alt=alt, line=line, solid=solid);
ldraw_lib__logo_train_2006_box(line=0.2);
// file: ../p/box5-12.scad
use <../lib.scad>
function ldraw_lib__box5_12() = [
// 0 Box with 5 Faces without Any Edges
// 0 Name: box5-12.dat
// 0 Author: Chris Dee [cwdee]
// 0 !LDRAW_ORG Primitive UPDATE 2009-02
// 0 !LICENSE Licensed under CC BY 4.0 : see CAreadme.txt
// 
// 0 BFC CERTIFY CCW
  [0,"BFC","CERTIFY"],
  [0,"BFC","CCW"],
// 
// 0 !HISTORY 2009-09-03 [PTadmin] Official Update 2009-02
// 
// 
// 4 16 1 1 1 1 1 -1 -1 1 -1 -1 1 1
  [4,16,1,1,1,1,1,-1,-1,1,-1,-1,1,1],
// 4 16 -1 0 1 1 0 1 1 1 1 -1 1 1
  [4,16,-1,0,1,1,0,1,1,1,1,-1,1,1],
// 4 16 -1 0 -1 -1 0 1 -1 1 1 -1 1 -1
  [4,16,-1,0,-1,-1,0,1,-1,1,1,-1,1,-1],
// 4 16 1 0 -1 -1 0 -1 -1 1 -1 1 1 -1
  [4,16,1,0,-1,-1,0,-1,-1,1,-1,1,1,-1],
// 4 16 1 0 1 1 0 -1 1 1 -1 1 1 1
  [4,16,1,0,1,1,0,-1,1,1,-1,1,1,1],
// 0
];
module ldraw_lib__box5_12(step=0, col=false, unit=2/5, alt=false, line=0.2, solid=!$preview)
    makepoly(ldraw_lib__box5_12(), step=step, col=col, unit=unit, alt=alt, line=line, solid=solid);
ldraw_lib__box5_12(line=0.2);
// main file
use <../lib.scad>
use <../p/box5-12.scad>
use <../p/logo-train-2006-box.scad>
use <../p/logo-train-2006.scad>
function ldraw_lib__4586246b() = [
// 0 Sticker  1.8 x  3.8 with White Train Logo (2006)
// 0 Name: 4586246b.dat
// 0 Author: Gerald Lasser [GeraldLasser]
// 0 !LDRAW_ORG Part UPDATE 2023-07
// 0 !LICENSE Licensed under CC BY 4.0 : see CAreadme.txt
// 
// 0 BFC CERTIFY CCW
  [0,"BFC","CERTIFY"],
  [0,"BFC","CCW"],
// 
// 0 !KEYWORDS Set 7938
// 
// 0 !HISTORY 2023-12-31 [OrionP] Official Update 2023-07
// 
// 
// 1 16 0 -.25 0 38 0 0 0 .25 0 0 0 18 box5-12.dat
  [1,16,0,-.25,0,38,0,0,0,.25,0,0,0,18, ldraw_lib__box5_12()],
// 
// 1 15 0 0 0 1 0 0 0 1 0 0 0 1 logo-train-2006.dat
  [1,15,0,0,0,1,0,0,0,1,0,0,0,1, ldraw_lib__logo_train_2006()],
// 1 16 0 0 0 1 0 0 0 1 0 0 0 1 logo-train-2006-box.dat
  [1,16,0,0,0,1,0,0,0,1,0,0,0,1, ldraw_lib__logo_train_2006_box()],
// 
// 3 16 -38 -.25 18 -35 -.25 12 -21.5662 -.25 11.6778
  [3,16,-38,-.25,18,-35,-.25,12,-21.5662,-.25,11.6778],
// 3 16 -38 -.25 18 -21.5662 -.25 11.6778 -12 -.25 12
  [3,16,-38,-.25,18,-21.5662,-.25,11.6778,-12,-.25,12],
// 3 16 -38 -.25 18 -12 -.25 12 0 -.25 12
  [3,16,-38,-.25,18,-12,-.25,12,0,-.25,12],
// 3 16 -38 -.25 18 0 -.25 12 38 -.25 18
  [3,16,-38,-.25,18,0,-.25,12,38,-.25,18],
// 3 16 38 -.25 18 0 -.25 12 12 -.25 12
  [3,16,38,-.25,18,0,-.25,12,12,-.25,12],
// 3 16 38 -.25 18 12 -.25 12 21.5662 -.25 11.6778
  [3,16,38,-.25,18,12,-.25,12,21.5662,-.25,11.6778],
// 3 16 38 -.25 18 21.5662 -.25 11.6778 35 -.25 12
  [3,16,38,-.25,18,21.5662,-.25,11.6778,35,-.25,12],
// 3 16 35 -.25 12 35 -.25 0 38 -.25 18
  [3,16,35,-.25,12,35,-.25,0,38,-.25,18],
// 3 16 38 -.25 18 35 -.25 0 38 -.25 -18
  [3,16,38,-.25,18,35,-.25,0,38,-.25,-18],
// 3 16 38 -.25 -18 35 -.25 0 35 -.25 -12
  [3,16,38,-.25,-18,35,-.25,0,35,-.25,-12],
// 3 16 38 -.25 -18 35 -.25 -12 21.5662 -.25 -11.6778
  [3,16,38,-.25,-18,35,-.25,-12,21.5662,-.25,-11.6778],
// 3 16 38 -.25 -18 21.5662 -.25 -11.6778 12 -.25 -12
  [3,16,38,-.25,-18,21.5662,-.25,-11.6778,12,-.25,-12],
// 3 16 38 -.25 -18 12 -.25 -12 0 -.25 -12
  [3,16,38,-.25,-18,12,-.25,-12,0,-.25,-12],
// 3 16 38 -.25 -18 0 -.25 -12 -38 -.25 -18
  [3,16,38,-.25,-18,0,-.25,-12,-38,-.25,-18],
// 3 16 -38 -.25 -18 0 -.25 -12 -12 -.25 -12
  [3,16,-38,-.25,-18,0,-.25,-12,-12,-.25,-12],
// 3 16 -38 -.25 -18 -12 -.25 -12 -21.5662 -.25 -11.6778
  [3,16,-38,-.25,-18,-12,-.25,-12,-21.5662,-.25,-11.6778],
// 3 16 -38 -.25 -18 -21.5662 -.25 -11.6778 -35 -.25 -12
  [3,16,-38,-.25,-18,-21.5662,-.25,-11.6778,-35,-.25,-12],
// 3 16 -38 -.25 -18 -35 -.25 -12 -35 -.25 0
  [3,16,-38,-.25,-18,-35,-.25,-12,-35,-.25,0],
// 3 16 -38 -.25 -18 -35 -.25 0 -38 -.25 18
  [3,16,-38,-.25,-18,-35,-.25,0,-38,-.25,18],
// 3 16 -38 -.25 18 -35 -.25 0 -35 -.25 12
  [3,16,-38,-.25,18,-35,-.25,0,-35,-.25,12],
];
module ldraw_lib__4586246b(step=0, col=false, unit=2/5, alt=false, line=0.2, solid=!$preview)
    makepoly(ldraw_lib__4586246b(), step=step, col=col, unit=unit, alt=alt, line=line, solid=solid);
ldraw_lib__4586246b(line=0.2);
